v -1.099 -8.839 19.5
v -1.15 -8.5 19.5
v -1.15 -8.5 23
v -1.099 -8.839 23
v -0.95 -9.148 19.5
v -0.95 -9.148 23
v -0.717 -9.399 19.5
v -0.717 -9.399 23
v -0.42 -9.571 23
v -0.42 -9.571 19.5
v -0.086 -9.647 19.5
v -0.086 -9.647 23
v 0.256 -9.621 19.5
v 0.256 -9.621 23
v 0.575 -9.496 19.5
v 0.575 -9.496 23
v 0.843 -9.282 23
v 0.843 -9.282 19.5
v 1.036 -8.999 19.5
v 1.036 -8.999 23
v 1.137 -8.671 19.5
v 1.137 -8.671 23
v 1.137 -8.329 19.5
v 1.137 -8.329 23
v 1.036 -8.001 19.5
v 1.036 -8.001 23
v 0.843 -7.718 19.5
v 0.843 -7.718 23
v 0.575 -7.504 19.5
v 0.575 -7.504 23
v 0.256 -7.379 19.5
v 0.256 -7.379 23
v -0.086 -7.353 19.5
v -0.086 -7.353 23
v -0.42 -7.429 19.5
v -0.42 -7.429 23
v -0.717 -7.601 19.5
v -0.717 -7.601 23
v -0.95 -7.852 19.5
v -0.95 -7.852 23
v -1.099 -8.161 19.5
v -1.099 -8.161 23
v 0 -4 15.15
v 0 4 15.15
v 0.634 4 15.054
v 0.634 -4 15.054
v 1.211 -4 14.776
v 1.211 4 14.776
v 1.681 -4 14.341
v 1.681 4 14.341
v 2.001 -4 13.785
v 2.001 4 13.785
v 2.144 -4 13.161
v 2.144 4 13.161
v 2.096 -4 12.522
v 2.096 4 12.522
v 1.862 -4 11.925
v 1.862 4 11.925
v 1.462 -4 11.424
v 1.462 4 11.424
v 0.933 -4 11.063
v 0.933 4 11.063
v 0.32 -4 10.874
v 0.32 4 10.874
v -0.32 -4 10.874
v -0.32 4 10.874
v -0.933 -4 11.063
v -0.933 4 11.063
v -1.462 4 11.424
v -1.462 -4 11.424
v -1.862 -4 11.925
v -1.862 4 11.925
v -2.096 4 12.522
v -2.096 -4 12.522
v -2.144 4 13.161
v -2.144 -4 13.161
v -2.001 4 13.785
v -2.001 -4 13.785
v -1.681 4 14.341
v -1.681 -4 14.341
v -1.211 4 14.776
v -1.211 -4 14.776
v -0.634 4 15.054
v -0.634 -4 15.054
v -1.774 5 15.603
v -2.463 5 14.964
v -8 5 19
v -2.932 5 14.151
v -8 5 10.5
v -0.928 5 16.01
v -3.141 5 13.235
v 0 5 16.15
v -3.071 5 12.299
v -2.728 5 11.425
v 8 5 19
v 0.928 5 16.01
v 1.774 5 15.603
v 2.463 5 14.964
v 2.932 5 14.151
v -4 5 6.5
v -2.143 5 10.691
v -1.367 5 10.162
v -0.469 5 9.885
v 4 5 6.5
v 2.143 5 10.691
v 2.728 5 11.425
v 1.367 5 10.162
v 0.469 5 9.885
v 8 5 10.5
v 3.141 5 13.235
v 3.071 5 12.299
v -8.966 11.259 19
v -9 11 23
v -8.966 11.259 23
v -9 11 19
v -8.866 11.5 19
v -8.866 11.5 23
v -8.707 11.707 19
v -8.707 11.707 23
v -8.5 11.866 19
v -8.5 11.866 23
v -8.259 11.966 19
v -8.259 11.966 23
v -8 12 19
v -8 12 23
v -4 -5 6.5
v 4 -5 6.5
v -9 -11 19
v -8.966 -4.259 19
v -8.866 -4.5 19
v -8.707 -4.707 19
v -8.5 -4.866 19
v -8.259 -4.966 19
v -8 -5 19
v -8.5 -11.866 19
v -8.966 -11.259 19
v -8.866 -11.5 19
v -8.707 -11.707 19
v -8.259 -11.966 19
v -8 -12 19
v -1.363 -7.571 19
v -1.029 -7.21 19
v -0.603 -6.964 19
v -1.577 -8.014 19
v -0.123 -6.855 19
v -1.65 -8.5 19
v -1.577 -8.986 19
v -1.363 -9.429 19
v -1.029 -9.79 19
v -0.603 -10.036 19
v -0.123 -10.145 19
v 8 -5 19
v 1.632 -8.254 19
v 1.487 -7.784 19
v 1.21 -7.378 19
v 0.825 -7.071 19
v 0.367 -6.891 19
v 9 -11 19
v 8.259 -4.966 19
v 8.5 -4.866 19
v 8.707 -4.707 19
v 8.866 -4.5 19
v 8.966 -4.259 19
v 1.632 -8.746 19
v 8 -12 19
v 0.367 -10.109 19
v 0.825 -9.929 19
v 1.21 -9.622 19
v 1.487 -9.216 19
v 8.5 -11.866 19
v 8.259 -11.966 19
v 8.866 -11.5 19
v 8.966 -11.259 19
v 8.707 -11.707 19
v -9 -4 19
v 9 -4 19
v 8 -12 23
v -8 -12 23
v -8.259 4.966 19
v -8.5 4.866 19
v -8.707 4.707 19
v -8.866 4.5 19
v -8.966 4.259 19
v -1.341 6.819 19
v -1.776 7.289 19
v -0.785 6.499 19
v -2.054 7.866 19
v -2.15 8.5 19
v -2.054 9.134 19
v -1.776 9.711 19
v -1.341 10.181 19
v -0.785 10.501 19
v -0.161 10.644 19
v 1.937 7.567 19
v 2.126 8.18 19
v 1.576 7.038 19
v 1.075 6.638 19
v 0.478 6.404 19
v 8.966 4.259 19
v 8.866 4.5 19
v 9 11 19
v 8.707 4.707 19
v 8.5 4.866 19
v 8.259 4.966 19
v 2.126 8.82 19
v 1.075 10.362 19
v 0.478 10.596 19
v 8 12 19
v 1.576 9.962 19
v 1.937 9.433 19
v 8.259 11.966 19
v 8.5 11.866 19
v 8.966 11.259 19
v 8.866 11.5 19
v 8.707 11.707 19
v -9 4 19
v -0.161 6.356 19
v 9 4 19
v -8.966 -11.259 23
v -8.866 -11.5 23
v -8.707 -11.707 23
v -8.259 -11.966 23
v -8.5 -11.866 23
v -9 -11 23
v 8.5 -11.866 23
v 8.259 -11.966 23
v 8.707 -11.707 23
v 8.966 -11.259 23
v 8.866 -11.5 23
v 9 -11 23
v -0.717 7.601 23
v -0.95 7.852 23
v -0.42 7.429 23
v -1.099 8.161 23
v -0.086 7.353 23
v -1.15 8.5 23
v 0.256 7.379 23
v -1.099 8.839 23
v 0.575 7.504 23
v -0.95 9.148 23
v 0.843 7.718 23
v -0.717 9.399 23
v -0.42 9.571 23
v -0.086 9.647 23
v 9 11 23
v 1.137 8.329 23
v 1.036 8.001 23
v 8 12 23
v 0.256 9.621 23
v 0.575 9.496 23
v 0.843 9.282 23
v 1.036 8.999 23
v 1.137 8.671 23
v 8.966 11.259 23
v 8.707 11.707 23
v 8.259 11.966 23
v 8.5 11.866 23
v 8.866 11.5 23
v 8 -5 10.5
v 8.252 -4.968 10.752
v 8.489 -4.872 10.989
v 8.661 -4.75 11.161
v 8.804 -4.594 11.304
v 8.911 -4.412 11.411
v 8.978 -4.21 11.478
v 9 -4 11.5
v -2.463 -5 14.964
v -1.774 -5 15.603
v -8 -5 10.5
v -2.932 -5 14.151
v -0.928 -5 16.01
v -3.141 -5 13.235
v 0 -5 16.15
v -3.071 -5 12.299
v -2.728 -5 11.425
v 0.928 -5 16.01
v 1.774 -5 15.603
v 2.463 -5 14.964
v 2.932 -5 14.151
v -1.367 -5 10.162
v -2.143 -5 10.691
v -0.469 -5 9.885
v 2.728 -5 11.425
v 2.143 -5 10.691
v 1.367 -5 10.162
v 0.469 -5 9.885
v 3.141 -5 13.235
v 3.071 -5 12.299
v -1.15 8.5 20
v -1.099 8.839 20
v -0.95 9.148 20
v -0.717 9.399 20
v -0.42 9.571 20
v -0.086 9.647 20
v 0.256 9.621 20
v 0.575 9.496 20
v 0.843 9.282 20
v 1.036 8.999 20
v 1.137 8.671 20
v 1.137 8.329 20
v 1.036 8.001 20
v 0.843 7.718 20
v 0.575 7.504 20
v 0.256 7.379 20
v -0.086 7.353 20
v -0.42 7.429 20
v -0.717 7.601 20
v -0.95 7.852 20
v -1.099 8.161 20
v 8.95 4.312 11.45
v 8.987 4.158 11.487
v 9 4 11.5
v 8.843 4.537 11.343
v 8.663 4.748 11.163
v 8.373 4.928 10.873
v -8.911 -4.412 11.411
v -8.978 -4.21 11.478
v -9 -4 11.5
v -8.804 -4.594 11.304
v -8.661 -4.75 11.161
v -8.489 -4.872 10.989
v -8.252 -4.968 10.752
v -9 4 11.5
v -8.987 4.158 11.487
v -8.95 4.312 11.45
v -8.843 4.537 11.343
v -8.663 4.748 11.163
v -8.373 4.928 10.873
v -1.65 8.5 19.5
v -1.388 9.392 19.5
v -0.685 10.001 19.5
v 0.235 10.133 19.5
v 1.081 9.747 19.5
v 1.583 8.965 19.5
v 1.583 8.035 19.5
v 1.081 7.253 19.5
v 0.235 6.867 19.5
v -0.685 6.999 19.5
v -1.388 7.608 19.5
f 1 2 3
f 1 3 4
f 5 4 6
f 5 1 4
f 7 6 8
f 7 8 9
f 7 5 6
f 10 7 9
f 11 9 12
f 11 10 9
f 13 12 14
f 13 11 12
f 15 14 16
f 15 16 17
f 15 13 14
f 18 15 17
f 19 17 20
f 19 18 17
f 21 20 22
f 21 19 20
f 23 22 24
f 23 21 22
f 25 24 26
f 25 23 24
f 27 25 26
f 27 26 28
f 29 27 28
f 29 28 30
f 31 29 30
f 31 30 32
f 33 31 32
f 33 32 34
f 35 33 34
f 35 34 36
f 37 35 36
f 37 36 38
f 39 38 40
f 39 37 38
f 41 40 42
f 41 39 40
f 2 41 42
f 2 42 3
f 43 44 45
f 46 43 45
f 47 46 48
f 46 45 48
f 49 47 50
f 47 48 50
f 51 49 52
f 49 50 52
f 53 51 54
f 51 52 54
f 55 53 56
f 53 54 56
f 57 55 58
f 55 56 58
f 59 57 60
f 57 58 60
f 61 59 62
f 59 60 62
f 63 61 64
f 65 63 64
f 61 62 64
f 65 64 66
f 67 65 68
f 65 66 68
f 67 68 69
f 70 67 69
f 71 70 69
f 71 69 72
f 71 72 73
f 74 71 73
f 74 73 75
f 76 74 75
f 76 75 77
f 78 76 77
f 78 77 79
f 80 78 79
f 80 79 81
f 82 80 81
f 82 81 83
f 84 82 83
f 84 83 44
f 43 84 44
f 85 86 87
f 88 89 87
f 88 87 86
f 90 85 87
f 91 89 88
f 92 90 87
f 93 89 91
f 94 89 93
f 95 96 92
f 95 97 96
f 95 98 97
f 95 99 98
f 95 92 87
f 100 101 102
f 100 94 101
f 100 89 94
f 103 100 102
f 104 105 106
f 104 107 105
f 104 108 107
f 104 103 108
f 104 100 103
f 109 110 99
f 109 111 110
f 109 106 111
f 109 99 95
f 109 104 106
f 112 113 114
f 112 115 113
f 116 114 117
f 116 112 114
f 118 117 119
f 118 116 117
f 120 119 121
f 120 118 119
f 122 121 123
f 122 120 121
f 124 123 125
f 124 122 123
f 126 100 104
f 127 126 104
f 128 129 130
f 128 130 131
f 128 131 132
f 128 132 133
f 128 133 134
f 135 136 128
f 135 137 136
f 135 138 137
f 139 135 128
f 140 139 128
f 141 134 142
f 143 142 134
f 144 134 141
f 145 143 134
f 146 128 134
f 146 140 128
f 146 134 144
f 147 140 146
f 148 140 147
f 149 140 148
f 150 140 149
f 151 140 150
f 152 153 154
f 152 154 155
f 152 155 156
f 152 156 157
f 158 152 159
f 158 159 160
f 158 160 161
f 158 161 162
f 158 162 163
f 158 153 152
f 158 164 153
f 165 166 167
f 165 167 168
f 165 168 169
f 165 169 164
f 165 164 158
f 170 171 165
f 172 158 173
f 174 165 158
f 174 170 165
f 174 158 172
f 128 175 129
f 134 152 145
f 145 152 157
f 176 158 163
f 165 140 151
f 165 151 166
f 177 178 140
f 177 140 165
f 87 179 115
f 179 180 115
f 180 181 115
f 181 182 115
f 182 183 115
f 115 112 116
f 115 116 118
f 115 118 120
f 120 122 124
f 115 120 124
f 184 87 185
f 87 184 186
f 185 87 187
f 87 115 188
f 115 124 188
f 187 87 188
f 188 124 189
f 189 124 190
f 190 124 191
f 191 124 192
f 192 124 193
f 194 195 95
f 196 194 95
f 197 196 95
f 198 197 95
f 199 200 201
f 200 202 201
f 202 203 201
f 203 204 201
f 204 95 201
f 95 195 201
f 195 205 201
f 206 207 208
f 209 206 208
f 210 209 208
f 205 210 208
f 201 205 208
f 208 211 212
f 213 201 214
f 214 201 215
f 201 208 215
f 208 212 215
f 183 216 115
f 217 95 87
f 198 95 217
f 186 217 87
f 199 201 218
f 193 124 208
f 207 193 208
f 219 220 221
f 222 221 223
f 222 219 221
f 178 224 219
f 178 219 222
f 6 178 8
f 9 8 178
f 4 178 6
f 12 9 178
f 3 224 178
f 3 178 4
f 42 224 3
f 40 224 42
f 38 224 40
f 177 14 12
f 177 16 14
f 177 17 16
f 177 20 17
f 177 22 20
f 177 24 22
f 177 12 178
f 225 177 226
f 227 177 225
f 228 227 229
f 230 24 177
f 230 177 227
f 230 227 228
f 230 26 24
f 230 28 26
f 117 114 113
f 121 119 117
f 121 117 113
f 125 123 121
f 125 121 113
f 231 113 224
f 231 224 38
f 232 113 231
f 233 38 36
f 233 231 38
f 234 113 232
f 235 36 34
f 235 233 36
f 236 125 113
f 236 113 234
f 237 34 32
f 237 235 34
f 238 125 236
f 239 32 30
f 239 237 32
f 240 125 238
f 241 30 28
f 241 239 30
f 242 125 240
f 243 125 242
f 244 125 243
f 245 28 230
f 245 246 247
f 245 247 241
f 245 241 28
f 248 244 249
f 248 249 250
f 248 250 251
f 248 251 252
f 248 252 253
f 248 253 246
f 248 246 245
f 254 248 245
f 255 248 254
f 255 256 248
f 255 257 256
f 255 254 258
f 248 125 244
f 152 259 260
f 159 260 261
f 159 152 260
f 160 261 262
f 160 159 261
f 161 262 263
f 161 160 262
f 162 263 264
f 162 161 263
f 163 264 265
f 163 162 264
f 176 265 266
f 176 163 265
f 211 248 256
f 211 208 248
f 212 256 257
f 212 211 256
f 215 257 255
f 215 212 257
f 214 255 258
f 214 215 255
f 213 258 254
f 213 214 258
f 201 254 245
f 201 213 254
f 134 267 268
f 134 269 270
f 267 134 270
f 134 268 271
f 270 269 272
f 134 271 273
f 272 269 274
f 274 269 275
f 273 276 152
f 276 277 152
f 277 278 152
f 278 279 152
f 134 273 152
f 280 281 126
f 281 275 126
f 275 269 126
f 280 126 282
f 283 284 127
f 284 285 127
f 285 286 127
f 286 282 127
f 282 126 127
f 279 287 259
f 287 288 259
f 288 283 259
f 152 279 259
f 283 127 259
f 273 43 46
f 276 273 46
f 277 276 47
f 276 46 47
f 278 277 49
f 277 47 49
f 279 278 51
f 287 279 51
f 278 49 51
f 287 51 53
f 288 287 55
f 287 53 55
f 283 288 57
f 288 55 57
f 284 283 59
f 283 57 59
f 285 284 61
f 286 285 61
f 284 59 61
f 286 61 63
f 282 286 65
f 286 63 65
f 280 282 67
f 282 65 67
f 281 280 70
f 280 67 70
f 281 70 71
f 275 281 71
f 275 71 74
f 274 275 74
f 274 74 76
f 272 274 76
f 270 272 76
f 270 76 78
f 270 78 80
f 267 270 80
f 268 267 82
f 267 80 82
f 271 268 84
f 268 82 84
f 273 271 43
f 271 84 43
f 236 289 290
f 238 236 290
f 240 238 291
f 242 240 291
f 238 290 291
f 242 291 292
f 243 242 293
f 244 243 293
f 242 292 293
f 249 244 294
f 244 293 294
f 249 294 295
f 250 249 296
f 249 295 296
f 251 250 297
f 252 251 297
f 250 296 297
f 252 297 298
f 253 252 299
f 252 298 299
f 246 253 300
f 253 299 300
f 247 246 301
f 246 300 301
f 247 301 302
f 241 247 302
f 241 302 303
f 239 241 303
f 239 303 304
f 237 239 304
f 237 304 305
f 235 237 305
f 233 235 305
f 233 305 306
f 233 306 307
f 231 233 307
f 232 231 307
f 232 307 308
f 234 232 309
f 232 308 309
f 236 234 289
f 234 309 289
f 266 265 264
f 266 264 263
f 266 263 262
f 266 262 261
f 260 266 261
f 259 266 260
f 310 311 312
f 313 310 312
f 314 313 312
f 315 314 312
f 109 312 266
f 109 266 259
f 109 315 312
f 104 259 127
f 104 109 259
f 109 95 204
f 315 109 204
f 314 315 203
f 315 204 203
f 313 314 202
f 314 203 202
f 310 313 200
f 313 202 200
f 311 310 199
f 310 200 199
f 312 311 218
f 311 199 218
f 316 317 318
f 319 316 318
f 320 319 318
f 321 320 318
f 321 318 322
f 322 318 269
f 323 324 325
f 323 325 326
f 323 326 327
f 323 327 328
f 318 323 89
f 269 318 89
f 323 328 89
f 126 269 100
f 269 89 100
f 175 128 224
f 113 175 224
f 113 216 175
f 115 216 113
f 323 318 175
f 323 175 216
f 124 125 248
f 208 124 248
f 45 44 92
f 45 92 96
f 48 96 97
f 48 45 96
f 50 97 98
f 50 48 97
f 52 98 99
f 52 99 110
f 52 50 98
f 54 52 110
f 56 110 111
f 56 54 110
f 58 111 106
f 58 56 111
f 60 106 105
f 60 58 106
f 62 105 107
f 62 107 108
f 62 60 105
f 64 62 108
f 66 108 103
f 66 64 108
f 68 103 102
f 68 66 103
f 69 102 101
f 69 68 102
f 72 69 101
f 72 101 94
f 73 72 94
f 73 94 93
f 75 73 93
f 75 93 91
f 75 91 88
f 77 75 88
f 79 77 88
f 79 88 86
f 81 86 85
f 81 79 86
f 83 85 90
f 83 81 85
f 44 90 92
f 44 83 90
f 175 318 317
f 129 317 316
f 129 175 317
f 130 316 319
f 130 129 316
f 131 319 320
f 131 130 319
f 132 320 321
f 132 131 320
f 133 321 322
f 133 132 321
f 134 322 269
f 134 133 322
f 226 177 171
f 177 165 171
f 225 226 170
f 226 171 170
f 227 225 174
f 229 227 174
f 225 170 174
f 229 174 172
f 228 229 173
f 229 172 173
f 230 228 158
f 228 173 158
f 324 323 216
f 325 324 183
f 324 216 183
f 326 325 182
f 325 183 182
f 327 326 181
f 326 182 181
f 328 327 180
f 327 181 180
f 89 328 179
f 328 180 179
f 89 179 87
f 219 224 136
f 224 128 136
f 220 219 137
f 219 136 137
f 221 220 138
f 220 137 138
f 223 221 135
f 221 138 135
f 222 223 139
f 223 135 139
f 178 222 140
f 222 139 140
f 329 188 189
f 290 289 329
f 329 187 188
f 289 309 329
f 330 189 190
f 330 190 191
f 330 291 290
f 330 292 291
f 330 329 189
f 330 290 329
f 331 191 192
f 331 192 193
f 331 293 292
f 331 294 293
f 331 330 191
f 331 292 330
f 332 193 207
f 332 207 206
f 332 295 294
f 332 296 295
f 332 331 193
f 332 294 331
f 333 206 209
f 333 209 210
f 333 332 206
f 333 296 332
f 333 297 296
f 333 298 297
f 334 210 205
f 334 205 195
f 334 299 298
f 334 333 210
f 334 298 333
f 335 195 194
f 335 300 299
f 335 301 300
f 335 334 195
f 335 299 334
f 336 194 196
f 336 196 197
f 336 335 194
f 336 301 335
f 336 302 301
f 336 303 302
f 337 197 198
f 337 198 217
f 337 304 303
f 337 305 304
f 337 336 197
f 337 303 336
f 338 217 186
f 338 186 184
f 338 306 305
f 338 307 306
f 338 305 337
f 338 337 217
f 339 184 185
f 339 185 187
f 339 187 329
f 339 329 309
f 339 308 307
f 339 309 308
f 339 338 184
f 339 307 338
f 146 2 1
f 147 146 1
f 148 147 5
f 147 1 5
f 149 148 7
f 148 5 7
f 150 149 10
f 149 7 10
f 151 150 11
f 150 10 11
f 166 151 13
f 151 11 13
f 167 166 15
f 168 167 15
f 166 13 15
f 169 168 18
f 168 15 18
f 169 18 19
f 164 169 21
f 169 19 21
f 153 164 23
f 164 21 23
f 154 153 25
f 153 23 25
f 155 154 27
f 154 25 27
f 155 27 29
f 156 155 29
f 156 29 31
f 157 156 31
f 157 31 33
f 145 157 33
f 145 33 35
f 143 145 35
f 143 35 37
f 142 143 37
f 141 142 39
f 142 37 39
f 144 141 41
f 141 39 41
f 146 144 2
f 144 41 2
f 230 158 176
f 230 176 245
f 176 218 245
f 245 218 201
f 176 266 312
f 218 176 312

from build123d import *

# Parameters (mm, degrees)
SKETCH_1_W             = 18
SKETCH_1_H             = 10
EXTRUDE_1_DEPTH        = 23
SKETCH_3_R             = 2.15
CUT_EXTRUDE_1_DEPTH    = 23
FILLET_1_R             = 1
SKETCH_4_W             = 18
SKETCH_4_H             = 6.5
CUT_EXTRUDE_2_DEPTH    = 23
SKETCH_5_W             = 18
SKETCH_5_H             = 12
EXTRUDE_2_DEPTH        = 4
SKETCH_6_R             = 1.15
CUT_EXTRUDE_3_DEPTH    = 4
FILLET_2_R             = 1
CHAMFER_1_SIZE         = 1
FILLET_2_OF_MIRROR_1_R = 1
CHAMFER_2_SIZE         = 0.5
CUT_EXTRUDE_4_DEPTH    = 10


with BuildPart() as part:
    # 草图1 → 凸台-拉伸1 (new body)
    with BuildSketch(Plane.XY):
        Rectangle(SKETCH_1_W, SKETCH_1_H)
    extrude(amount=EXTRUDE_1_DEPTH)

    # 草图3 → 切除-拉伸1 (cut)
    with BuildSketch(Plane(origin=(0, 5, 0), x_dir=(1, 0, 0), z_dir=(0, 1, 0))):
        with Locations(Location((0, -13, 0), (0, 0, 270))):
            Circle(SKETCH_3_R)
    extrude(amount=-CUT_EXTRUDE_1_DEPTH, mode=Mode.SUBTRACT)

    # 圆角1
    fillet_1_edges = [part.edges().sort_by_distance(p)[0] for p in [
        (9, -5, 11.5),
        (-9, -5, 11.5),
        (-9, 5, 11.5),
        (9, 5, 11.5),
    ]]
    fillet(fillet_1_edges, radius=FILLET_1_R)

    # 草图4 → 切除-拉伸2 (cut)
    with BuildSketch(Plane(origin=(0, 5, 0), x_dir=(1, 0, 0), z_dir=(0, 1, 0))):
        with Locations((0, -3.25)):
            Rectangle(SKETCH_4_W, SKETCH_4_H)
    extrude(amount=-CUT_EXTRUDE_2_DEPTH, mode=Mode.SUBTRACT)

    # 草图5 → 凸台-拉伸2 (add)
    with BuildSketch(Plane.XY.offset(23)):
        with Locations((0, 6)):
            Rectangle(SKETCH_5_W, SKETCH_5_H)
    extrude_2 = extrude(amount=-EXTRUDE_2_DEPTH)

    # 草图6 → 切除-拉伸3 (cut)
    with BuildSketch(Plane(origin=(0, 0, 19), x_dir=(-1, 0, 0), z_dir=(0, 0, -1))):
        with Locations((0, 8.5)):
            Circle(SKETCH_6_R)
    cut_extrude_3 = extrude(amount=-CUT_EXTRUDE_3_DEPTH, mode=Mode.SUBTRACT)

    # 圆角2
    fillet_2_edges = [part.edges().sort_by_distance(p)[0] for p in [
        (9, 12, 21),
        (-9, 12, 21),
    ]]
    fillet(fillet_2_edges, radius=FILLET_2_R)

    # 倒角1
    chamfer_1_edges = [part.edges().sort_by_distance(p)[0] for p in [
        (1.15, 8.5, 19),
        (0, -5, 10.85),
        (0, 5, 10.85),
    ]]
    chamfer(chamfer_1_edges, length=CHAMFER_1_SIZE)

    # 镜向1: 凸台-拉伸2, 切除-拉伸3 across plane
    add(extrude_2.mirror(Plane.ZX))
    add(cut_extrude_3.mirror(Plane.ZX), mode=Mode.SUBTRACT)

    # 圆角2 of 镜向1
    fillet_2_of_mirror_1_edges = [part.edges().sort_by_distance(p)[0] for p in [
        (9, -12, 21),
        (-9, -12, 21),
    ]]
    fillet(fillet_2_of_mirror_1_edges, radius=FILLET_2_OF_MIRROR_1_R)

    # 倒角2
    chamfer_2_edges = [part.edges().sort_by_distance(p)[0] for p in [
        (1.15, -8.5, 19),
    ]]
    chamfer(chamfer_2_edges, length=CHAMFER_2_SIZE)

    # 草图7 → 切除-拉伸4 (cut)
    with BuildSketch(Plane(origin=(0, 5, 0), x_dir=(1, 0, 0), z_dir=(0, 1, 0))):
        Polygon((-9, -11.5), (-4, -6.5), (-9, -6.5), align=None)
        Polygon((9, -11.5), (4, -6.5), (9, -6.5), align=None)
    extrude(amount=-CUT_EXTRUDE_4_DEPTH, mode=Mode.SUBTRACT)


solid = part.part
